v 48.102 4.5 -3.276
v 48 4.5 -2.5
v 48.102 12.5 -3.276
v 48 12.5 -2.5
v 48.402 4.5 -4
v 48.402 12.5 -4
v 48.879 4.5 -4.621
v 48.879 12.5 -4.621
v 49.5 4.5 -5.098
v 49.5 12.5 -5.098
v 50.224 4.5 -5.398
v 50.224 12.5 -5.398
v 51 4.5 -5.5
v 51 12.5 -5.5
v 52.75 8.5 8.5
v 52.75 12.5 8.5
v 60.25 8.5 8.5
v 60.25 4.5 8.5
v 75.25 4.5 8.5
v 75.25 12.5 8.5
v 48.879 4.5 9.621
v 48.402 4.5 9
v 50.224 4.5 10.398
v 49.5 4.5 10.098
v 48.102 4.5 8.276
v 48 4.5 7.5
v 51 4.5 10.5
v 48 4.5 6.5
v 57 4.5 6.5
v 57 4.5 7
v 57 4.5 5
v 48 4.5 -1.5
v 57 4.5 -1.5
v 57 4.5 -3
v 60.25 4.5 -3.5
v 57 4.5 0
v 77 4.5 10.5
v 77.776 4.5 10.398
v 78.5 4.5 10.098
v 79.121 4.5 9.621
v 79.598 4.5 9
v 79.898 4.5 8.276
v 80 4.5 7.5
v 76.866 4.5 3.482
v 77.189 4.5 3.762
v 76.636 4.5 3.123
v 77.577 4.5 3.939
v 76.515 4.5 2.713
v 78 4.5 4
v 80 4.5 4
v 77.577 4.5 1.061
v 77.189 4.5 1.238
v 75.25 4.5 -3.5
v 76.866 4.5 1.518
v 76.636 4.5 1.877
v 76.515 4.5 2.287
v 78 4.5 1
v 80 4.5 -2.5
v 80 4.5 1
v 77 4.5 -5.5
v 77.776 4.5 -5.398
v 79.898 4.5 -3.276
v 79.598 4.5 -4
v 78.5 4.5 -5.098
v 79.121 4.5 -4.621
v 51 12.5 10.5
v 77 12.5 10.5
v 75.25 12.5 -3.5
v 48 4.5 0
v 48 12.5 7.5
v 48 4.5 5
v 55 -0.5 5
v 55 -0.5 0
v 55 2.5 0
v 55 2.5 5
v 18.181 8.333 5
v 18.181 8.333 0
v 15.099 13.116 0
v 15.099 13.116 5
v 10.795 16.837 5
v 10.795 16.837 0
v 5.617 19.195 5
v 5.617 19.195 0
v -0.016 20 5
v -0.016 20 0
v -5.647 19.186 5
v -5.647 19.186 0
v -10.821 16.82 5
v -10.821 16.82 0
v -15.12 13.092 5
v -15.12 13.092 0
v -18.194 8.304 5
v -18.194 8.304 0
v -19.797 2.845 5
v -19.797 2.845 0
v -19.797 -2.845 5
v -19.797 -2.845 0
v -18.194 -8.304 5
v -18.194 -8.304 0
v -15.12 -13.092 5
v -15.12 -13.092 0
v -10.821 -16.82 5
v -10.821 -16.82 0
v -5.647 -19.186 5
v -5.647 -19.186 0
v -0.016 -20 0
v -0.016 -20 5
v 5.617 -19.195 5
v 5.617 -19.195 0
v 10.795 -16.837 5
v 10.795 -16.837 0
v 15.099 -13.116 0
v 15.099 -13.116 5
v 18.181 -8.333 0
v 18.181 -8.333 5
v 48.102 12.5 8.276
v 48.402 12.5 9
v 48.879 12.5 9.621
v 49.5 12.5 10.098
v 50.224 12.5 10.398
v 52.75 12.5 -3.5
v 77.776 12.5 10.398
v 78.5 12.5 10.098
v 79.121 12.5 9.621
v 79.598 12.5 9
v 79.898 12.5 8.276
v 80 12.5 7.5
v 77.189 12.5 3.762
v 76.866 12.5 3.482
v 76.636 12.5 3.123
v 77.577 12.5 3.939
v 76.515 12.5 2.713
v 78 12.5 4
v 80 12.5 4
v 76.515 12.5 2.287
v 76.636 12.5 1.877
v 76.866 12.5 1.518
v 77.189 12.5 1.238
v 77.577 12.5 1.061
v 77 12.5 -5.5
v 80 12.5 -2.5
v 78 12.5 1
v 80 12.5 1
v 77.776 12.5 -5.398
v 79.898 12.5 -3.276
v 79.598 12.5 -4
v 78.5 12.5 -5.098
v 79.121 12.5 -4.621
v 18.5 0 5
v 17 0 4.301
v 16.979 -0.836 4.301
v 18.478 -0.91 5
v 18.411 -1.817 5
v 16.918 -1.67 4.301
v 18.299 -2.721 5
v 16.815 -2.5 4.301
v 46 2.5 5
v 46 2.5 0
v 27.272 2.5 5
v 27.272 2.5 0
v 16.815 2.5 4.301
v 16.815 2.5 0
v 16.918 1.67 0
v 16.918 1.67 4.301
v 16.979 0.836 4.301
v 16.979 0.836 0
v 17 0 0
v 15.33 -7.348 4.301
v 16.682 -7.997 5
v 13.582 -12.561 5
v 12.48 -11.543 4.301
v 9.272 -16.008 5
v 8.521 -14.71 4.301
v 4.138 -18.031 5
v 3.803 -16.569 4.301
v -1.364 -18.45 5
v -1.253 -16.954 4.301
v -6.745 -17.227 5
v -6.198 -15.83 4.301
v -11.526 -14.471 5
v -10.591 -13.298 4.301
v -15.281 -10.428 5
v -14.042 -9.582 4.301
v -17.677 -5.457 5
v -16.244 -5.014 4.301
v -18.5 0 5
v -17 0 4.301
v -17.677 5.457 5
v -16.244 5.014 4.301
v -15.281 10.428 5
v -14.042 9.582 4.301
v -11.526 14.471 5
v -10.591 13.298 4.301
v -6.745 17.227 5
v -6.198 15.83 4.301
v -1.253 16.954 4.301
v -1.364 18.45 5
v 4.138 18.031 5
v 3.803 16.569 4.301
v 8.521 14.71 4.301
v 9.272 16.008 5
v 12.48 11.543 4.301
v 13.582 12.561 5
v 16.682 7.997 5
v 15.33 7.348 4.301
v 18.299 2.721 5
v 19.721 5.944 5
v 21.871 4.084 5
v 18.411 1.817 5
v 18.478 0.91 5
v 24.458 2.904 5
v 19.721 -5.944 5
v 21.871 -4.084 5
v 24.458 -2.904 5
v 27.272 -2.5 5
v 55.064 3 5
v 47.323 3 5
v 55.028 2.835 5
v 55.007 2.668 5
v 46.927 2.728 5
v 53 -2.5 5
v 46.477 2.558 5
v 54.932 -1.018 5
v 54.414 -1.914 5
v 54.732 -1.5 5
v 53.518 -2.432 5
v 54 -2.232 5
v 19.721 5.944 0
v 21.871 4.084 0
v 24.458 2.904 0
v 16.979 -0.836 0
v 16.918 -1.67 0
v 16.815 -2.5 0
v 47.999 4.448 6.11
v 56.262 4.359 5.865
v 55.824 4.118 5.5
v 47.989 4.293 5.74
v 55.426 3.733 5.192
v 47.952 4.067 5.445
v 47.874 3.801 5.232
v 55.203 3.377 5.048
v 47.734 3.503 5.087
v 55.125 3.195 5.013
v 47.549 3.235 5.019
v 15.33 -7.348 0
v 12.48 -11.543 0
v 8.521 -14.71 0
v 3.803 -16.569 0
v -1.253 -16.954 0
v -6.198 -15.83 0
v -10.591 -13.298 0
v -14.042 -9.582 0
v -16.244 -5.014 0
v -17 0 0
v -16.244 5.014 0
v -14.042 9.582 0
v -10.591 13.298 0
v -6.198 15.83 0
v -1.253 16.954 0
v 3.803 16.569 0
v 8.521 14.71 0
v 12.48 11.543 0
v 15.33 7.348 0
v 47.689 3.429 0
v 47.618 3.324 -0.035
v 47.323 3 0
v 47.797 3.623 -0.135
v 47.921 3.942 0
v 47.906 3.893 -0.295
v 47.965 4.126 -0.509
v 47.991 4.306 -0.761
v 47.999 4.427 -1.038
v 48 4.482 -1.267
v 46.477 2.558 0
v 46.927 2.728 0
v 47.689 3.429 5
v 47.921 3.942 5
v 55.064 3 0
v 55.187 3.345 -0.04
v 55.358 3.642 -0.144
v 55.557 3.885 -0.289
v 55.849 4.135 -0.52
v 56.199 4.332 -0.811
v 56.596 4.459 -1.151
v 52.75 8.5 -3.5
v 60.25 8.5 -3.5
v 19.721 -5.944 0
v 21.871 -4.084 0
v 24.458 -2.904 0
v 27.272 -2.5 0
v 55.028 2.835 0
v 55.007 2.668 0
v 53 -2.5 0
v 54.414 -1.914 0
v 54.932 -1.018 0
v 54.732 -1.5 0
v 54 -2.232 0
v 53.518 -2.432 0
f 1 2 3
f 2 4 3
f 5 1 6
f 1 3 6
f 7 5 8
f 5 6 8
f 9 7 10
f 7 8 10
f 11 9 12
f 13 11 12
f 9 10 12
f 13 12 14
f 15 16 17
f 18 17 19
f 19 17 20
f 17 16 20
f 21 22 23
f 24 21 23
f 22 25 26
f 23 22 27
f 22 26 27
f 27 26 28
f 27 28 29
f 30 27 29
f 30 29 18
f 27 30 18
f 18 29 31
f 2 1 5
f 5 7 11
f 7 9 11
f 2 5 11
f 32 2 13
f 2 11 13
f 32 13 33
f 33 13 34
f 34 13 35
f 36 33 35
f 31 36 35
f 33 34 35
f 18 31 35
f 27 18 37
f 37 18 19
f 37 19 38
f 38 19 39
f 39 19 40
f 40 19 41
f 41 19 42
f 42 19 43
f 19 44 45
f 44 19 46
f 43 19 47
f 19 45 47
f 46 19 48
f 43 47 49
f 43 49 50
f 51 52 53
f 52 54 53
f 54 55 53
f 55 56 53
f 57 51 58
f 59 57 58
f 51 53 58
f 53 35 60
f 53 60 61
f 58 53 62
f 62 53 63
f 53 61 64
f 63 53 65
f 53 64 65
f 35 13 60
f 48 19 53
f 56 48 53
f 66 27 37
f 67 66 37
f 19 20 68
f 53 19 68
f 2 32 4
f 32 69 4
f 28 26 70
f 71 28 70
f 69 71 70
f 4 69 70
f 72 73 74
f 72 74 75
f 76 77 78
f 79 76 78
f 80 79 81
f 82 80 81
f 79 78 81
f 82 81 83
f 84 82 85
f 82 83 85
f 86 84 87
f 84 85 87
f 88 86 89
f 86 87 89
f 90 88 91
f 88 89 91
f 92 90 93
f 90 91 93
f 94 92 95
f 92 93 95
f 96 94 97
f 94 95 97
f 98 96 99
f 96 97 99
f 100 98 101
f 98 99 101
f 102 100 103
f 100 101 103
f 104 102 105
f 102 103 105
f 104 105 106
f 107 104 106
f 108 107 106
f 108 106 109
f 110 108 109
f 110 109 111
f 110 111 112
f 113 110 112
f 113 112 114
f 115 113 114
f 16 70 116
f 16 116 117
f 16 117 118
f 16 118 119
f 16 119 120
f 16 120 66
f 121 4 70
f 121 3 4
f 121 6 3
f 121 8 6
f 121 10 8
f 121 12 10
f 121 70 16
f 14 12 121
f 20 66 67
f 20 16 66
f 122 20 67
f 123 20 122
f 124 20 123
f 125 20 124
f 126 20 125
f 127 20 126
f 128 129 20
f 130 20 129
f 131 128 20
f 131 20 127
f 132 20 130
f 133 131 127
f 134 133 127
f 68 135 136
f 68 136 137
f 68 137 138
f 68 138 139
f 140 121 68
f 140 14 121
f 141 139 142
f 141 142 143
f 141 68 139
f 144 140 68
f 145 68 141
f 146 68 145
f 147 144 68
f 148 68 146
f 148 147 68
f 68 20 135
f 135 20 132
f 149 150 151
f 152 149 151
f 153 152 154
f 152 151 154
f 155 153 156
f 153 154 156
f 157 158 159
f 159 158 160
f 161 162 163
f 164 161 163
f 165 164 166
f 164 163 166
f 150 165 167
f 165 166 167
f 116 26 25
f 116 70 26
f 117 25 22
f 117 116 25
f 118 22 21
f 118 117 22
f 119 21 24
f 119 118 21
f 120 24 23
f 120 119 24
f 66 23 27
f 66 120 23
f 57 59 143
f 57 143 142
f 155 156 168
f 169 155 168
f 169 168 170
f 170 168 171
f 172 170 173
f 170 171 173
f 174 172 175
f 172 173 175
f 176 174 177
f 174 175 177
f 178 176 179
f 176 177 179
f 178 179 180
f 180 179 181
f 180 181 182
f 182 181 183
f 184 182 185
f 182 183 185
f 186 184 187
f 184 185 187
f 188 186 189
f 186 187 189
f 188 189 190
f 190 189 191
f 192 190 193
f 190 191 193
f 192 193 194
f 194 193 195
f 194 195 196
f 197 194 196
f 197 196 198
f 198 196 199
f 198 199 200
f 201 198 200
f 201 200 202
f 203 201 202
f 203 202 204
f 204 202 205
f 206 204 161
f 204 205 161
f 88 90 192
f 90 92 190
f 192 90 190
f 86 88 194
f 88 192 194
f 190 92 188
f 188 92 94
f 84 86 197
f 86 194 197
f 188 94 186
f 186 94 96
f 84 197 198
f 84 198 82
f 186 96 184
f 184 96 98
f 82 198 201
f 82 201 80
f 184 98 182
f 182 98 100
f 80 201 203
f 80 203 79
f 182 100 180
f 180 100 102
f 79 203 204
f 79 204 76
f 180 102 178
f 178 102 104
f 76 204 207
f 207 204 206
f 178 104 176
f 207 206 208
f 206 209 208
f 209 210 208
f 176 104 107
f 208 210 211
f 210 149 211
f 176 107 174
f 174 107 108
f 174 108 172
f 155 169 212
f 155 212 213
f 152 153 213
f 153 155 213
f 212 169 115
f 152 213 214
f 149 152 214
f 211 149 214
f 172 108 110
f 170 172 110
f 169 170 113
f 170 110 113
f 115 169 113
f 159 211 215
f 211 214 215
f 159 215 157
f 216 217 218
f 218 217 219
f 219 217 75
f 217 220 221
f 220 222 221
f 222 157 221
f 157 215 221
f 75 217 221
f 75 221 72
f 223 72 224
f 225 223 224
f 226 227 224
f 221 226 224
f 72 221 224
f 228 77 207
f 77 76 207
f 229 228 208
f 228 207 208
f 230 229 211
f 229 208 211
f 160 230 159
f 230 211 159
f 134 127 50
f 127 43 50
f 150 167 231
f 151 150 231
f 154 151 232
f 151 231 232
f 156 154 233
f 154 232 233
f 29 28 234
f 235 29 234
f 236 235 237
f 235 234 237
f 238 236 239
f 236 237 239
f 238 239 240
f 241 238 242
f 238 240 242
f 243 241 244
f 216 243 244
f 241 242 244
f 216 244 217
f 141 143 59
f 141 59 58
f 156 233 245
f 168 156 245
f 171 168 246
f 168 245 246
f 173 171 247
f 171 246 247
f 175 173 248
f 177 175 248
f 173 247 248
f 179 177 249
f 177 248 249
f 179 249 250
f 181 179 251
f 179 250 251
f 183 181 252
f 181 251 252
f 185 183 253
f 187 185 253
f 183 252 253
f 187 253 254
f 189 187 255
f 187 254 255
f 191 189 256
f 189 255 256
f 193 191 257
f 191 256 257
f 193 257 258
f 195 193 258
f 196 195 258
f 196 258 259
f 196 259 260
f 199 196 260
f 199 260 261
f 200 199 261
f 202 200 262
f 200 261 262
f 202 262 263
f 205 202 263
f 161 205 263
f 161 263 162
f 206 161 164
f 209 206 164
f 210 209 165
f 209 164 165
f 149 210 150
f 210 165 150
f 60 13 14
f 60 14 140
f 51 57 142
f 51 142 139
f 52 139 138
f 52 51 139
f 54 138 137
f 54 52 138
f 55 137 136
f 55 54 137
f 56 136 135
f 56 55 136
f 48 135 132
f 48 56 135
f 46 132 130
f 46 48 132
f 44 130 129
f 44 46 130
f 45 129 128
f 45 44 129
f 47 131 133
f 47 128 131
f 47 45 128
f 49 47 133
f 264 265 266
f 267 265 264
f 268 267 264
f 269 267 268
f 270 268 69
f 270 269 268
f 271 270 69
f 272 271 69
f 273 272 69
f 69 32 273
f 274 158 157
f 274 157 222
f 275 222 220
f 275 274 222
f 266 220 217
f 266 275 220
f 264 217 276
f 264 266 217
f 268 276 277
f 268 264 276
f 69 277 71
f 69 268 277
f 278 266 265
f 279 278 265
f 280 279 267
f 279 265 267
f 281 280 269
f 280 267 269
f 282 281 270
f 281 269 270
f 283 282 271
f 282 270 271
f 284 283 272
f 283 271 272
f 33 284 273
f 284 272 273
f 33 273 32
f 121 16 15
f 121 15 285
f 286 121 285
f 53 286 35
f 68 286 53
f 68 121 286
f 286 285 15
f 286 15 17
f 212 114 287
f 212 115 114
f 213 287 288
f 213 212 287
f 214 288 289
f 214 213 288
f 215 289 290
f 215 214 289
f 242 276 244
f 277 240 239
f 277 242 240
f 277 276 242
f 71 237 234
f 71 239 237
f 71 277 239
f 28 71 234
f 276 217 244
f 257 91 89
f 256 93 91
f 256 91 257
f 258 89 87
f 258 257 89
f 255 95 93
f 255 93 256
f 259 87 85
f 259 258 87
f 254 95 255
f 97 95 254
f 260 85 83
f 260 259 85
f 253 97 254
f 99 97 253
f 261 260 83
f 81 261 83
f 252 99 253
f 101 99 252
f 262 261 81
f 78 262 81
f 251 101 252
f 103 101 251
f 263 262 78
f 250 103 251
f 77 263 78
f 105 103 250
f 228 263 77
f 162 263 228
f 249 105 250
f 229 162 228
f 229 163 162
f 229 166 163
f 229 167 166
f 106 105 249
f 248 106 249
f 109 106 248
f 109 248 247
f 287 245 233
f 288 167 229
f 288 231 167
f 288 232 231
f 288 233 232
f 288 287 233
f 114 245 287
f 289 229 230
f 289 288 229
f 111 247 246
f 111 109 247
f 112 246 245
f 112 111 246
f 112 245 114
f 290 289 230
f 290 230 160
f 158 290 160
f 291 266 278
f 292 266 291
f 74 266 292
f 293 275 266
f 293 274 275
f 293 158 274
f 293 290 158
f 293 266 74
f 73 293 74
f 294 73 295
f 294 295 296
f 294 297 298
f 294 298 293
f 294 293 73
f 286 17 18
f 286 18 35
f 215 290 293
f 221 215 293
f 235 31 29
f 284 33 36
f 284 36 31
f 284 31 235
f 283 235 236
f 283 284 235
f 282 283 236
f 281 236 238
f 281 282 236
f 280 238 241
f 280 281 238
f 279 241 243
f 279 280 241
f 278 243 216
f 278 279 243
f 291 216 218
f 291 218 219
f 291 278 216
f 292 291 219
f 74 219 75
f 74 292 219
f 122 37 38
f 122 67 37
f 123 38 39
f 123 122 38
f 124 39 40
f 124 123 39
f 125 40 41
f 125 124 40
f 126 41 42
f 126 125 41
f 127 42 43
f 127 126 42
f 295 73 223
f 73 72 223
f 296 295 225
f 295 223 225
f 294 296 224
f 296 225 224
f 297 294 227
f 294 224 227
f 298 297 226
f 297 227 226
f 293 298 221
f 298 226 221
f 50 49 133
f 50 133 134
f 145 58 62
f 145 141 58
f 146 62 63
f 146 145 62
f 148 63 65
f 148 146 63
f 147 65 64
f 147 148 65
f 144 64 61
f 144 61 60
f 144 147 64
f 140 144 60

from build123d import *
from build123d.topology import SkipClean

# Parameters (mm, degrees)
BOSS_EXTRUDE1_DEPTH = 5
CHAMFER2_SIZE       = 1.5
CHAMFER2_SIZE2      = 0.699461487
FILLET1_R           = 10
SKETCH10_W          = 32
SKETCH10_H          = 5
BOSS_EXTRUDE3_DEPTH = 2
SKETCH5_W           = 32
SKETCH5_H           = 16
BOSS_EXTRUDE2_DEPTH = 8
SKETCH6_W           = 22.5
SKETCH6_H           = 12
CUT_EXTRUDE1_DEPTH  = 4
SKETCH7_W           = 25
SKETCH7_H           = 5
CUT_EXTRUDE2_DEPTH  = 7
SKETCH8_W           = 15
SKETCH8_H           = 12
CUT_EXTRUDE3_DEPTH  = 86.571607441
CUT_EXTRUDE4_DEPTH  = 85.32378075
FILLET2_R           = 2
FILLET3_START       = 48
FILLET3_DEPTH       = 6.9999999
FILLET3_START_2     = 47.322875556
FILLET3_2_DEPTH     = 9.677124544
FILLET3_START_3     = -3
FILLET3_3_DEPTH     = 10
FILLET4_R           = 3


with BuildPart() as part:
    # Sketch1 → Boss-Extrude1 (new body)
    with BuildSketch(Plane.XY):
        with BuildLine():
            ThreePointArc((16.815171721, -2.5), (-17, 0), (16.815171721, 2.5))
            Line((16.815171721, 2.5), (19.843134833, 2.5))
            ThreePointArc((19.843134833, 2.5), (-20, 0), (19.843134833, -2.5))
            Line((19.843134833, -2.5), (16.815171721, -2.5))
        make_face()
        with BuildLine():
            Line((19.843134833, 2.5), (16.815171721, 2.5))
            ThreePointArc((16.815171721, 2.5), (16.953729962, 1.253411494), (17, 0))
            ThreePointArc((17, 0), (16.953729962, -1.253411494), (16.815171721, -2.5))
            Line((16.815171721, -2.5), (19.843134833, -2.5))
            ThreePointArc((19.843134833, -2.5), (19.960745185, -1.252458251), (20, 0))
            ThreePointArc((20, 0), (19.960745185, 1.252458251), (19.843134833, 2.5))
        make_face()
        with BuildLine():
            Line((80, 2.5), (19.843134833, 2.5))
            ThreePointArc((19.843134833, 2.5), (19.960745185, 1.252458251), (20, 0))
            ThreePointArc((20, 0), (19.960745185, -1.252458251), (19.843134833, -2.5))
            Line((19.843134833, -2.5), (80, -2.5))
            Line((80, -2.5), (80, 2.5))
        make_face()
    extrude(amount=BOSS_EXTRUDE1_DEPTH)

    # Chamfer2
    chamfer2_edges = [part.edges().sort_by_distance(p)[0] for p in [
        (-16.815171721, -2.5, 5),
    ]]
    chamfer2_side = [part.faces().sort_by_distance(p)[0] for p in [
        (23.12129627, 0, 5),
    ]]
    chamfer(chamfer2_edges, length=CHAMFER2_SIZE, length2=CHAMFER2_SIZE2, reference=chamfer2_side[0])

    # Fillet1
    fillet1_edges = [part.edges().sort_by_distance(p)[0] for p in [
        (19.843134833, 2.5, 2.5),
        (19.843134833, -2.5, 2.5),
    ]]
    fillet(fillet1_edges, radius=FILLET1_R)

    # Sketch10 → Boss-Extrude3 (add)
    with BuildSketch(Plane(origin=(0, 2.5, 0), x_dir=(1, 0, 0), z_dir=(0, 1, 0))):
        with Locations((64, -2.5)):
            Rectangle(SKETCH10_W, SKETCH10_H)
    extrude(amount=BOSS_EXTRUDE3_DEPTH)

    # Sketch5 → Boss-Extrude2 (add)
    with BuildSketch(Plane(origin=(0, 4.5, 0), x_dir=(1, 0, 0), z_dir=(0, 1, 0))):
        with Locations((64, -2.5)):
            Rectangle(SKETCH5_W, SKETCH5_H)
    extrude(amount=BOSS_EXTRUDE2_DEPTH)

    # Sketch6 → Cut-Extrude1 (cut)
    with BuildSketch(Plane(origin=(0, 12.5, 0), x_dir=(1, 0, 0), z_dir=(0, 1, 0))):
        with Locations((64, -2.5)):
            Rectangle(SKETCH6_W, SKETCH6_H)
    extrude(amount=-CUT_EXTRUDE1_DEPTH, mode=Mode.SUBTRACT)

    # Sketch7 → Cut-Extrude2 (cut)
    with BuildSketch(Plane.XZ.offset(2.5)):
        with Locations((67.5, 2.5)):
            Rectangle(SKETCH7_W, SKETCH7_H)
    extrude(amount=-CUT_EXTRUDE2_DEPTH, mode=Mode.SUBTRACT)

    # Sketch8 → Cut-Extrude3 (cut, through all)
    with BuildSketch(Plane(origin=(0, 8.5, 0), x_dir=(1, 0, 0), z_dir=(0, 1, 0))):
        with Locations((67.75, -2.5)):
            Rectangle(SKETCH8_W, SKETCH8_H)
    extrude(amount=-CUT_EXTRUDE3_DEPTH, mode=Mode.SUBTRACT)

    # Sketch9 → Cut-Extrude4 (cut, through all)
    with BuildSketch(Plane.XZ.offset(-4.5)):
        with BuildLine():
            Line((78, 4), (80, 4))
            Line((80, 4), (80, 1))
            Line((80, 1), (78, 1))
            ThreePointArc((78, 1), (76.5, 2.5), (78, 4))
        make_face()
    extrude(amount=-CUT_EXTRUDE4_DEPTH, mode=Mode.SUBTRACT)

    # Fillet2
    fillet2_edges = [part.edges().sort_by_distance(p)[0] for p in [
        (55, 4.5, 2.5),
        (48, 2.5, 2.5),
        (55, -2.5, 2.5),
    ]]
    fillet(fillet2_edges, radius=FILLET2_R)

    # Fillet3: read off the stored shape, not the designer's step
    # Fillet3 outline → Fillet3 (add)
    with BuildSketch(Plane.YZ.offset(FILLET3_START)):
        with BuildLine():
            Line((4.5, -1.5), (4.5, 0))
            Line((4.5, 0), (3, 0))
            ThreePointArc((3, 0), (4.060660172, -0.439339828), (4.5, -1.5))
        make_face()
        with BuildLine():
            ThreePointArc((4.5, 6.5), (4.060660172, 5.439339828), (3, 5))
            Line((3, 5), (4.5, 5))
            Line((4.5, 5), (4.5, 6.5))
        make_face()
    extrude(amount=FILLET3_DEPTH)

    # Fillet3 2 outline → Fillet3 2 (add)
    with BuildSketch(Plane.YZ.offset(FILLET3_START_2)):
        with BuildLine():
            Line((4.5, -1.5), (4.5, 0))
            Line((4.5, 0), (3, 0))
            ThreePointArc((3, 0), (4.060660172, -0.439339828), (4.5, -1.5))
        make_face()
        with BuildLine():
            ThreePointArc((4.5, 6.5), (4.060660172, 5.439339828), (3, 5))
            Line((3, 5), (4.5, 5))
            Line((4.5, 5), (4.5, 6.5))
        make_face()
    extrude(amount=FILLET3_2_DEPTH)

    # Fillet3 3 outline → Fillet3 3 (cut)
    with SkipClean():  # the faces are left unmerged after this step: merging them gives an invalid solid
        with BuildSketch(Plane.XY.offset(FILLET3_START_3)):
            with BuildLine():
                Line((47.322875556, 4.5), (47.3228756, 2.999999951))
                ThreePointArc((47.3228756, 2.999999951), (47.82287564, 3.67712431), (48, 4.5))
                Line((48, 4.5), (47.322875556, 4.5))
            make_face()
            with BuildLine():
                ThreePointArc((57, 4.5), (55.775255129, 4.08113883), (55.063508327, 3))
                Line((55.063508327, 3), (57.0000001, 3))
                Line((57.0000001, 3), (57, 4.5))
            make_face()
        extrude(amount=FILLET3_3_DEPTH, mode=Mode.SUBTRACT)
    add(part.part.scale(1), mode=Mode.REPLACE)  # the faces are merged on a copy

    # Fillet4
    fillet4_edges = [part.edges().sort_by_distance(p)[0] for p in [
        (80, 8.5, 10.5),
        (80, 8.5, -5.5),
        (48, 8.5, -5.5),
        (48, 8.5, 10.5),
    ]]
    fillet(fillet4_edges, radius=FILLET4_R)


solid = part.part
